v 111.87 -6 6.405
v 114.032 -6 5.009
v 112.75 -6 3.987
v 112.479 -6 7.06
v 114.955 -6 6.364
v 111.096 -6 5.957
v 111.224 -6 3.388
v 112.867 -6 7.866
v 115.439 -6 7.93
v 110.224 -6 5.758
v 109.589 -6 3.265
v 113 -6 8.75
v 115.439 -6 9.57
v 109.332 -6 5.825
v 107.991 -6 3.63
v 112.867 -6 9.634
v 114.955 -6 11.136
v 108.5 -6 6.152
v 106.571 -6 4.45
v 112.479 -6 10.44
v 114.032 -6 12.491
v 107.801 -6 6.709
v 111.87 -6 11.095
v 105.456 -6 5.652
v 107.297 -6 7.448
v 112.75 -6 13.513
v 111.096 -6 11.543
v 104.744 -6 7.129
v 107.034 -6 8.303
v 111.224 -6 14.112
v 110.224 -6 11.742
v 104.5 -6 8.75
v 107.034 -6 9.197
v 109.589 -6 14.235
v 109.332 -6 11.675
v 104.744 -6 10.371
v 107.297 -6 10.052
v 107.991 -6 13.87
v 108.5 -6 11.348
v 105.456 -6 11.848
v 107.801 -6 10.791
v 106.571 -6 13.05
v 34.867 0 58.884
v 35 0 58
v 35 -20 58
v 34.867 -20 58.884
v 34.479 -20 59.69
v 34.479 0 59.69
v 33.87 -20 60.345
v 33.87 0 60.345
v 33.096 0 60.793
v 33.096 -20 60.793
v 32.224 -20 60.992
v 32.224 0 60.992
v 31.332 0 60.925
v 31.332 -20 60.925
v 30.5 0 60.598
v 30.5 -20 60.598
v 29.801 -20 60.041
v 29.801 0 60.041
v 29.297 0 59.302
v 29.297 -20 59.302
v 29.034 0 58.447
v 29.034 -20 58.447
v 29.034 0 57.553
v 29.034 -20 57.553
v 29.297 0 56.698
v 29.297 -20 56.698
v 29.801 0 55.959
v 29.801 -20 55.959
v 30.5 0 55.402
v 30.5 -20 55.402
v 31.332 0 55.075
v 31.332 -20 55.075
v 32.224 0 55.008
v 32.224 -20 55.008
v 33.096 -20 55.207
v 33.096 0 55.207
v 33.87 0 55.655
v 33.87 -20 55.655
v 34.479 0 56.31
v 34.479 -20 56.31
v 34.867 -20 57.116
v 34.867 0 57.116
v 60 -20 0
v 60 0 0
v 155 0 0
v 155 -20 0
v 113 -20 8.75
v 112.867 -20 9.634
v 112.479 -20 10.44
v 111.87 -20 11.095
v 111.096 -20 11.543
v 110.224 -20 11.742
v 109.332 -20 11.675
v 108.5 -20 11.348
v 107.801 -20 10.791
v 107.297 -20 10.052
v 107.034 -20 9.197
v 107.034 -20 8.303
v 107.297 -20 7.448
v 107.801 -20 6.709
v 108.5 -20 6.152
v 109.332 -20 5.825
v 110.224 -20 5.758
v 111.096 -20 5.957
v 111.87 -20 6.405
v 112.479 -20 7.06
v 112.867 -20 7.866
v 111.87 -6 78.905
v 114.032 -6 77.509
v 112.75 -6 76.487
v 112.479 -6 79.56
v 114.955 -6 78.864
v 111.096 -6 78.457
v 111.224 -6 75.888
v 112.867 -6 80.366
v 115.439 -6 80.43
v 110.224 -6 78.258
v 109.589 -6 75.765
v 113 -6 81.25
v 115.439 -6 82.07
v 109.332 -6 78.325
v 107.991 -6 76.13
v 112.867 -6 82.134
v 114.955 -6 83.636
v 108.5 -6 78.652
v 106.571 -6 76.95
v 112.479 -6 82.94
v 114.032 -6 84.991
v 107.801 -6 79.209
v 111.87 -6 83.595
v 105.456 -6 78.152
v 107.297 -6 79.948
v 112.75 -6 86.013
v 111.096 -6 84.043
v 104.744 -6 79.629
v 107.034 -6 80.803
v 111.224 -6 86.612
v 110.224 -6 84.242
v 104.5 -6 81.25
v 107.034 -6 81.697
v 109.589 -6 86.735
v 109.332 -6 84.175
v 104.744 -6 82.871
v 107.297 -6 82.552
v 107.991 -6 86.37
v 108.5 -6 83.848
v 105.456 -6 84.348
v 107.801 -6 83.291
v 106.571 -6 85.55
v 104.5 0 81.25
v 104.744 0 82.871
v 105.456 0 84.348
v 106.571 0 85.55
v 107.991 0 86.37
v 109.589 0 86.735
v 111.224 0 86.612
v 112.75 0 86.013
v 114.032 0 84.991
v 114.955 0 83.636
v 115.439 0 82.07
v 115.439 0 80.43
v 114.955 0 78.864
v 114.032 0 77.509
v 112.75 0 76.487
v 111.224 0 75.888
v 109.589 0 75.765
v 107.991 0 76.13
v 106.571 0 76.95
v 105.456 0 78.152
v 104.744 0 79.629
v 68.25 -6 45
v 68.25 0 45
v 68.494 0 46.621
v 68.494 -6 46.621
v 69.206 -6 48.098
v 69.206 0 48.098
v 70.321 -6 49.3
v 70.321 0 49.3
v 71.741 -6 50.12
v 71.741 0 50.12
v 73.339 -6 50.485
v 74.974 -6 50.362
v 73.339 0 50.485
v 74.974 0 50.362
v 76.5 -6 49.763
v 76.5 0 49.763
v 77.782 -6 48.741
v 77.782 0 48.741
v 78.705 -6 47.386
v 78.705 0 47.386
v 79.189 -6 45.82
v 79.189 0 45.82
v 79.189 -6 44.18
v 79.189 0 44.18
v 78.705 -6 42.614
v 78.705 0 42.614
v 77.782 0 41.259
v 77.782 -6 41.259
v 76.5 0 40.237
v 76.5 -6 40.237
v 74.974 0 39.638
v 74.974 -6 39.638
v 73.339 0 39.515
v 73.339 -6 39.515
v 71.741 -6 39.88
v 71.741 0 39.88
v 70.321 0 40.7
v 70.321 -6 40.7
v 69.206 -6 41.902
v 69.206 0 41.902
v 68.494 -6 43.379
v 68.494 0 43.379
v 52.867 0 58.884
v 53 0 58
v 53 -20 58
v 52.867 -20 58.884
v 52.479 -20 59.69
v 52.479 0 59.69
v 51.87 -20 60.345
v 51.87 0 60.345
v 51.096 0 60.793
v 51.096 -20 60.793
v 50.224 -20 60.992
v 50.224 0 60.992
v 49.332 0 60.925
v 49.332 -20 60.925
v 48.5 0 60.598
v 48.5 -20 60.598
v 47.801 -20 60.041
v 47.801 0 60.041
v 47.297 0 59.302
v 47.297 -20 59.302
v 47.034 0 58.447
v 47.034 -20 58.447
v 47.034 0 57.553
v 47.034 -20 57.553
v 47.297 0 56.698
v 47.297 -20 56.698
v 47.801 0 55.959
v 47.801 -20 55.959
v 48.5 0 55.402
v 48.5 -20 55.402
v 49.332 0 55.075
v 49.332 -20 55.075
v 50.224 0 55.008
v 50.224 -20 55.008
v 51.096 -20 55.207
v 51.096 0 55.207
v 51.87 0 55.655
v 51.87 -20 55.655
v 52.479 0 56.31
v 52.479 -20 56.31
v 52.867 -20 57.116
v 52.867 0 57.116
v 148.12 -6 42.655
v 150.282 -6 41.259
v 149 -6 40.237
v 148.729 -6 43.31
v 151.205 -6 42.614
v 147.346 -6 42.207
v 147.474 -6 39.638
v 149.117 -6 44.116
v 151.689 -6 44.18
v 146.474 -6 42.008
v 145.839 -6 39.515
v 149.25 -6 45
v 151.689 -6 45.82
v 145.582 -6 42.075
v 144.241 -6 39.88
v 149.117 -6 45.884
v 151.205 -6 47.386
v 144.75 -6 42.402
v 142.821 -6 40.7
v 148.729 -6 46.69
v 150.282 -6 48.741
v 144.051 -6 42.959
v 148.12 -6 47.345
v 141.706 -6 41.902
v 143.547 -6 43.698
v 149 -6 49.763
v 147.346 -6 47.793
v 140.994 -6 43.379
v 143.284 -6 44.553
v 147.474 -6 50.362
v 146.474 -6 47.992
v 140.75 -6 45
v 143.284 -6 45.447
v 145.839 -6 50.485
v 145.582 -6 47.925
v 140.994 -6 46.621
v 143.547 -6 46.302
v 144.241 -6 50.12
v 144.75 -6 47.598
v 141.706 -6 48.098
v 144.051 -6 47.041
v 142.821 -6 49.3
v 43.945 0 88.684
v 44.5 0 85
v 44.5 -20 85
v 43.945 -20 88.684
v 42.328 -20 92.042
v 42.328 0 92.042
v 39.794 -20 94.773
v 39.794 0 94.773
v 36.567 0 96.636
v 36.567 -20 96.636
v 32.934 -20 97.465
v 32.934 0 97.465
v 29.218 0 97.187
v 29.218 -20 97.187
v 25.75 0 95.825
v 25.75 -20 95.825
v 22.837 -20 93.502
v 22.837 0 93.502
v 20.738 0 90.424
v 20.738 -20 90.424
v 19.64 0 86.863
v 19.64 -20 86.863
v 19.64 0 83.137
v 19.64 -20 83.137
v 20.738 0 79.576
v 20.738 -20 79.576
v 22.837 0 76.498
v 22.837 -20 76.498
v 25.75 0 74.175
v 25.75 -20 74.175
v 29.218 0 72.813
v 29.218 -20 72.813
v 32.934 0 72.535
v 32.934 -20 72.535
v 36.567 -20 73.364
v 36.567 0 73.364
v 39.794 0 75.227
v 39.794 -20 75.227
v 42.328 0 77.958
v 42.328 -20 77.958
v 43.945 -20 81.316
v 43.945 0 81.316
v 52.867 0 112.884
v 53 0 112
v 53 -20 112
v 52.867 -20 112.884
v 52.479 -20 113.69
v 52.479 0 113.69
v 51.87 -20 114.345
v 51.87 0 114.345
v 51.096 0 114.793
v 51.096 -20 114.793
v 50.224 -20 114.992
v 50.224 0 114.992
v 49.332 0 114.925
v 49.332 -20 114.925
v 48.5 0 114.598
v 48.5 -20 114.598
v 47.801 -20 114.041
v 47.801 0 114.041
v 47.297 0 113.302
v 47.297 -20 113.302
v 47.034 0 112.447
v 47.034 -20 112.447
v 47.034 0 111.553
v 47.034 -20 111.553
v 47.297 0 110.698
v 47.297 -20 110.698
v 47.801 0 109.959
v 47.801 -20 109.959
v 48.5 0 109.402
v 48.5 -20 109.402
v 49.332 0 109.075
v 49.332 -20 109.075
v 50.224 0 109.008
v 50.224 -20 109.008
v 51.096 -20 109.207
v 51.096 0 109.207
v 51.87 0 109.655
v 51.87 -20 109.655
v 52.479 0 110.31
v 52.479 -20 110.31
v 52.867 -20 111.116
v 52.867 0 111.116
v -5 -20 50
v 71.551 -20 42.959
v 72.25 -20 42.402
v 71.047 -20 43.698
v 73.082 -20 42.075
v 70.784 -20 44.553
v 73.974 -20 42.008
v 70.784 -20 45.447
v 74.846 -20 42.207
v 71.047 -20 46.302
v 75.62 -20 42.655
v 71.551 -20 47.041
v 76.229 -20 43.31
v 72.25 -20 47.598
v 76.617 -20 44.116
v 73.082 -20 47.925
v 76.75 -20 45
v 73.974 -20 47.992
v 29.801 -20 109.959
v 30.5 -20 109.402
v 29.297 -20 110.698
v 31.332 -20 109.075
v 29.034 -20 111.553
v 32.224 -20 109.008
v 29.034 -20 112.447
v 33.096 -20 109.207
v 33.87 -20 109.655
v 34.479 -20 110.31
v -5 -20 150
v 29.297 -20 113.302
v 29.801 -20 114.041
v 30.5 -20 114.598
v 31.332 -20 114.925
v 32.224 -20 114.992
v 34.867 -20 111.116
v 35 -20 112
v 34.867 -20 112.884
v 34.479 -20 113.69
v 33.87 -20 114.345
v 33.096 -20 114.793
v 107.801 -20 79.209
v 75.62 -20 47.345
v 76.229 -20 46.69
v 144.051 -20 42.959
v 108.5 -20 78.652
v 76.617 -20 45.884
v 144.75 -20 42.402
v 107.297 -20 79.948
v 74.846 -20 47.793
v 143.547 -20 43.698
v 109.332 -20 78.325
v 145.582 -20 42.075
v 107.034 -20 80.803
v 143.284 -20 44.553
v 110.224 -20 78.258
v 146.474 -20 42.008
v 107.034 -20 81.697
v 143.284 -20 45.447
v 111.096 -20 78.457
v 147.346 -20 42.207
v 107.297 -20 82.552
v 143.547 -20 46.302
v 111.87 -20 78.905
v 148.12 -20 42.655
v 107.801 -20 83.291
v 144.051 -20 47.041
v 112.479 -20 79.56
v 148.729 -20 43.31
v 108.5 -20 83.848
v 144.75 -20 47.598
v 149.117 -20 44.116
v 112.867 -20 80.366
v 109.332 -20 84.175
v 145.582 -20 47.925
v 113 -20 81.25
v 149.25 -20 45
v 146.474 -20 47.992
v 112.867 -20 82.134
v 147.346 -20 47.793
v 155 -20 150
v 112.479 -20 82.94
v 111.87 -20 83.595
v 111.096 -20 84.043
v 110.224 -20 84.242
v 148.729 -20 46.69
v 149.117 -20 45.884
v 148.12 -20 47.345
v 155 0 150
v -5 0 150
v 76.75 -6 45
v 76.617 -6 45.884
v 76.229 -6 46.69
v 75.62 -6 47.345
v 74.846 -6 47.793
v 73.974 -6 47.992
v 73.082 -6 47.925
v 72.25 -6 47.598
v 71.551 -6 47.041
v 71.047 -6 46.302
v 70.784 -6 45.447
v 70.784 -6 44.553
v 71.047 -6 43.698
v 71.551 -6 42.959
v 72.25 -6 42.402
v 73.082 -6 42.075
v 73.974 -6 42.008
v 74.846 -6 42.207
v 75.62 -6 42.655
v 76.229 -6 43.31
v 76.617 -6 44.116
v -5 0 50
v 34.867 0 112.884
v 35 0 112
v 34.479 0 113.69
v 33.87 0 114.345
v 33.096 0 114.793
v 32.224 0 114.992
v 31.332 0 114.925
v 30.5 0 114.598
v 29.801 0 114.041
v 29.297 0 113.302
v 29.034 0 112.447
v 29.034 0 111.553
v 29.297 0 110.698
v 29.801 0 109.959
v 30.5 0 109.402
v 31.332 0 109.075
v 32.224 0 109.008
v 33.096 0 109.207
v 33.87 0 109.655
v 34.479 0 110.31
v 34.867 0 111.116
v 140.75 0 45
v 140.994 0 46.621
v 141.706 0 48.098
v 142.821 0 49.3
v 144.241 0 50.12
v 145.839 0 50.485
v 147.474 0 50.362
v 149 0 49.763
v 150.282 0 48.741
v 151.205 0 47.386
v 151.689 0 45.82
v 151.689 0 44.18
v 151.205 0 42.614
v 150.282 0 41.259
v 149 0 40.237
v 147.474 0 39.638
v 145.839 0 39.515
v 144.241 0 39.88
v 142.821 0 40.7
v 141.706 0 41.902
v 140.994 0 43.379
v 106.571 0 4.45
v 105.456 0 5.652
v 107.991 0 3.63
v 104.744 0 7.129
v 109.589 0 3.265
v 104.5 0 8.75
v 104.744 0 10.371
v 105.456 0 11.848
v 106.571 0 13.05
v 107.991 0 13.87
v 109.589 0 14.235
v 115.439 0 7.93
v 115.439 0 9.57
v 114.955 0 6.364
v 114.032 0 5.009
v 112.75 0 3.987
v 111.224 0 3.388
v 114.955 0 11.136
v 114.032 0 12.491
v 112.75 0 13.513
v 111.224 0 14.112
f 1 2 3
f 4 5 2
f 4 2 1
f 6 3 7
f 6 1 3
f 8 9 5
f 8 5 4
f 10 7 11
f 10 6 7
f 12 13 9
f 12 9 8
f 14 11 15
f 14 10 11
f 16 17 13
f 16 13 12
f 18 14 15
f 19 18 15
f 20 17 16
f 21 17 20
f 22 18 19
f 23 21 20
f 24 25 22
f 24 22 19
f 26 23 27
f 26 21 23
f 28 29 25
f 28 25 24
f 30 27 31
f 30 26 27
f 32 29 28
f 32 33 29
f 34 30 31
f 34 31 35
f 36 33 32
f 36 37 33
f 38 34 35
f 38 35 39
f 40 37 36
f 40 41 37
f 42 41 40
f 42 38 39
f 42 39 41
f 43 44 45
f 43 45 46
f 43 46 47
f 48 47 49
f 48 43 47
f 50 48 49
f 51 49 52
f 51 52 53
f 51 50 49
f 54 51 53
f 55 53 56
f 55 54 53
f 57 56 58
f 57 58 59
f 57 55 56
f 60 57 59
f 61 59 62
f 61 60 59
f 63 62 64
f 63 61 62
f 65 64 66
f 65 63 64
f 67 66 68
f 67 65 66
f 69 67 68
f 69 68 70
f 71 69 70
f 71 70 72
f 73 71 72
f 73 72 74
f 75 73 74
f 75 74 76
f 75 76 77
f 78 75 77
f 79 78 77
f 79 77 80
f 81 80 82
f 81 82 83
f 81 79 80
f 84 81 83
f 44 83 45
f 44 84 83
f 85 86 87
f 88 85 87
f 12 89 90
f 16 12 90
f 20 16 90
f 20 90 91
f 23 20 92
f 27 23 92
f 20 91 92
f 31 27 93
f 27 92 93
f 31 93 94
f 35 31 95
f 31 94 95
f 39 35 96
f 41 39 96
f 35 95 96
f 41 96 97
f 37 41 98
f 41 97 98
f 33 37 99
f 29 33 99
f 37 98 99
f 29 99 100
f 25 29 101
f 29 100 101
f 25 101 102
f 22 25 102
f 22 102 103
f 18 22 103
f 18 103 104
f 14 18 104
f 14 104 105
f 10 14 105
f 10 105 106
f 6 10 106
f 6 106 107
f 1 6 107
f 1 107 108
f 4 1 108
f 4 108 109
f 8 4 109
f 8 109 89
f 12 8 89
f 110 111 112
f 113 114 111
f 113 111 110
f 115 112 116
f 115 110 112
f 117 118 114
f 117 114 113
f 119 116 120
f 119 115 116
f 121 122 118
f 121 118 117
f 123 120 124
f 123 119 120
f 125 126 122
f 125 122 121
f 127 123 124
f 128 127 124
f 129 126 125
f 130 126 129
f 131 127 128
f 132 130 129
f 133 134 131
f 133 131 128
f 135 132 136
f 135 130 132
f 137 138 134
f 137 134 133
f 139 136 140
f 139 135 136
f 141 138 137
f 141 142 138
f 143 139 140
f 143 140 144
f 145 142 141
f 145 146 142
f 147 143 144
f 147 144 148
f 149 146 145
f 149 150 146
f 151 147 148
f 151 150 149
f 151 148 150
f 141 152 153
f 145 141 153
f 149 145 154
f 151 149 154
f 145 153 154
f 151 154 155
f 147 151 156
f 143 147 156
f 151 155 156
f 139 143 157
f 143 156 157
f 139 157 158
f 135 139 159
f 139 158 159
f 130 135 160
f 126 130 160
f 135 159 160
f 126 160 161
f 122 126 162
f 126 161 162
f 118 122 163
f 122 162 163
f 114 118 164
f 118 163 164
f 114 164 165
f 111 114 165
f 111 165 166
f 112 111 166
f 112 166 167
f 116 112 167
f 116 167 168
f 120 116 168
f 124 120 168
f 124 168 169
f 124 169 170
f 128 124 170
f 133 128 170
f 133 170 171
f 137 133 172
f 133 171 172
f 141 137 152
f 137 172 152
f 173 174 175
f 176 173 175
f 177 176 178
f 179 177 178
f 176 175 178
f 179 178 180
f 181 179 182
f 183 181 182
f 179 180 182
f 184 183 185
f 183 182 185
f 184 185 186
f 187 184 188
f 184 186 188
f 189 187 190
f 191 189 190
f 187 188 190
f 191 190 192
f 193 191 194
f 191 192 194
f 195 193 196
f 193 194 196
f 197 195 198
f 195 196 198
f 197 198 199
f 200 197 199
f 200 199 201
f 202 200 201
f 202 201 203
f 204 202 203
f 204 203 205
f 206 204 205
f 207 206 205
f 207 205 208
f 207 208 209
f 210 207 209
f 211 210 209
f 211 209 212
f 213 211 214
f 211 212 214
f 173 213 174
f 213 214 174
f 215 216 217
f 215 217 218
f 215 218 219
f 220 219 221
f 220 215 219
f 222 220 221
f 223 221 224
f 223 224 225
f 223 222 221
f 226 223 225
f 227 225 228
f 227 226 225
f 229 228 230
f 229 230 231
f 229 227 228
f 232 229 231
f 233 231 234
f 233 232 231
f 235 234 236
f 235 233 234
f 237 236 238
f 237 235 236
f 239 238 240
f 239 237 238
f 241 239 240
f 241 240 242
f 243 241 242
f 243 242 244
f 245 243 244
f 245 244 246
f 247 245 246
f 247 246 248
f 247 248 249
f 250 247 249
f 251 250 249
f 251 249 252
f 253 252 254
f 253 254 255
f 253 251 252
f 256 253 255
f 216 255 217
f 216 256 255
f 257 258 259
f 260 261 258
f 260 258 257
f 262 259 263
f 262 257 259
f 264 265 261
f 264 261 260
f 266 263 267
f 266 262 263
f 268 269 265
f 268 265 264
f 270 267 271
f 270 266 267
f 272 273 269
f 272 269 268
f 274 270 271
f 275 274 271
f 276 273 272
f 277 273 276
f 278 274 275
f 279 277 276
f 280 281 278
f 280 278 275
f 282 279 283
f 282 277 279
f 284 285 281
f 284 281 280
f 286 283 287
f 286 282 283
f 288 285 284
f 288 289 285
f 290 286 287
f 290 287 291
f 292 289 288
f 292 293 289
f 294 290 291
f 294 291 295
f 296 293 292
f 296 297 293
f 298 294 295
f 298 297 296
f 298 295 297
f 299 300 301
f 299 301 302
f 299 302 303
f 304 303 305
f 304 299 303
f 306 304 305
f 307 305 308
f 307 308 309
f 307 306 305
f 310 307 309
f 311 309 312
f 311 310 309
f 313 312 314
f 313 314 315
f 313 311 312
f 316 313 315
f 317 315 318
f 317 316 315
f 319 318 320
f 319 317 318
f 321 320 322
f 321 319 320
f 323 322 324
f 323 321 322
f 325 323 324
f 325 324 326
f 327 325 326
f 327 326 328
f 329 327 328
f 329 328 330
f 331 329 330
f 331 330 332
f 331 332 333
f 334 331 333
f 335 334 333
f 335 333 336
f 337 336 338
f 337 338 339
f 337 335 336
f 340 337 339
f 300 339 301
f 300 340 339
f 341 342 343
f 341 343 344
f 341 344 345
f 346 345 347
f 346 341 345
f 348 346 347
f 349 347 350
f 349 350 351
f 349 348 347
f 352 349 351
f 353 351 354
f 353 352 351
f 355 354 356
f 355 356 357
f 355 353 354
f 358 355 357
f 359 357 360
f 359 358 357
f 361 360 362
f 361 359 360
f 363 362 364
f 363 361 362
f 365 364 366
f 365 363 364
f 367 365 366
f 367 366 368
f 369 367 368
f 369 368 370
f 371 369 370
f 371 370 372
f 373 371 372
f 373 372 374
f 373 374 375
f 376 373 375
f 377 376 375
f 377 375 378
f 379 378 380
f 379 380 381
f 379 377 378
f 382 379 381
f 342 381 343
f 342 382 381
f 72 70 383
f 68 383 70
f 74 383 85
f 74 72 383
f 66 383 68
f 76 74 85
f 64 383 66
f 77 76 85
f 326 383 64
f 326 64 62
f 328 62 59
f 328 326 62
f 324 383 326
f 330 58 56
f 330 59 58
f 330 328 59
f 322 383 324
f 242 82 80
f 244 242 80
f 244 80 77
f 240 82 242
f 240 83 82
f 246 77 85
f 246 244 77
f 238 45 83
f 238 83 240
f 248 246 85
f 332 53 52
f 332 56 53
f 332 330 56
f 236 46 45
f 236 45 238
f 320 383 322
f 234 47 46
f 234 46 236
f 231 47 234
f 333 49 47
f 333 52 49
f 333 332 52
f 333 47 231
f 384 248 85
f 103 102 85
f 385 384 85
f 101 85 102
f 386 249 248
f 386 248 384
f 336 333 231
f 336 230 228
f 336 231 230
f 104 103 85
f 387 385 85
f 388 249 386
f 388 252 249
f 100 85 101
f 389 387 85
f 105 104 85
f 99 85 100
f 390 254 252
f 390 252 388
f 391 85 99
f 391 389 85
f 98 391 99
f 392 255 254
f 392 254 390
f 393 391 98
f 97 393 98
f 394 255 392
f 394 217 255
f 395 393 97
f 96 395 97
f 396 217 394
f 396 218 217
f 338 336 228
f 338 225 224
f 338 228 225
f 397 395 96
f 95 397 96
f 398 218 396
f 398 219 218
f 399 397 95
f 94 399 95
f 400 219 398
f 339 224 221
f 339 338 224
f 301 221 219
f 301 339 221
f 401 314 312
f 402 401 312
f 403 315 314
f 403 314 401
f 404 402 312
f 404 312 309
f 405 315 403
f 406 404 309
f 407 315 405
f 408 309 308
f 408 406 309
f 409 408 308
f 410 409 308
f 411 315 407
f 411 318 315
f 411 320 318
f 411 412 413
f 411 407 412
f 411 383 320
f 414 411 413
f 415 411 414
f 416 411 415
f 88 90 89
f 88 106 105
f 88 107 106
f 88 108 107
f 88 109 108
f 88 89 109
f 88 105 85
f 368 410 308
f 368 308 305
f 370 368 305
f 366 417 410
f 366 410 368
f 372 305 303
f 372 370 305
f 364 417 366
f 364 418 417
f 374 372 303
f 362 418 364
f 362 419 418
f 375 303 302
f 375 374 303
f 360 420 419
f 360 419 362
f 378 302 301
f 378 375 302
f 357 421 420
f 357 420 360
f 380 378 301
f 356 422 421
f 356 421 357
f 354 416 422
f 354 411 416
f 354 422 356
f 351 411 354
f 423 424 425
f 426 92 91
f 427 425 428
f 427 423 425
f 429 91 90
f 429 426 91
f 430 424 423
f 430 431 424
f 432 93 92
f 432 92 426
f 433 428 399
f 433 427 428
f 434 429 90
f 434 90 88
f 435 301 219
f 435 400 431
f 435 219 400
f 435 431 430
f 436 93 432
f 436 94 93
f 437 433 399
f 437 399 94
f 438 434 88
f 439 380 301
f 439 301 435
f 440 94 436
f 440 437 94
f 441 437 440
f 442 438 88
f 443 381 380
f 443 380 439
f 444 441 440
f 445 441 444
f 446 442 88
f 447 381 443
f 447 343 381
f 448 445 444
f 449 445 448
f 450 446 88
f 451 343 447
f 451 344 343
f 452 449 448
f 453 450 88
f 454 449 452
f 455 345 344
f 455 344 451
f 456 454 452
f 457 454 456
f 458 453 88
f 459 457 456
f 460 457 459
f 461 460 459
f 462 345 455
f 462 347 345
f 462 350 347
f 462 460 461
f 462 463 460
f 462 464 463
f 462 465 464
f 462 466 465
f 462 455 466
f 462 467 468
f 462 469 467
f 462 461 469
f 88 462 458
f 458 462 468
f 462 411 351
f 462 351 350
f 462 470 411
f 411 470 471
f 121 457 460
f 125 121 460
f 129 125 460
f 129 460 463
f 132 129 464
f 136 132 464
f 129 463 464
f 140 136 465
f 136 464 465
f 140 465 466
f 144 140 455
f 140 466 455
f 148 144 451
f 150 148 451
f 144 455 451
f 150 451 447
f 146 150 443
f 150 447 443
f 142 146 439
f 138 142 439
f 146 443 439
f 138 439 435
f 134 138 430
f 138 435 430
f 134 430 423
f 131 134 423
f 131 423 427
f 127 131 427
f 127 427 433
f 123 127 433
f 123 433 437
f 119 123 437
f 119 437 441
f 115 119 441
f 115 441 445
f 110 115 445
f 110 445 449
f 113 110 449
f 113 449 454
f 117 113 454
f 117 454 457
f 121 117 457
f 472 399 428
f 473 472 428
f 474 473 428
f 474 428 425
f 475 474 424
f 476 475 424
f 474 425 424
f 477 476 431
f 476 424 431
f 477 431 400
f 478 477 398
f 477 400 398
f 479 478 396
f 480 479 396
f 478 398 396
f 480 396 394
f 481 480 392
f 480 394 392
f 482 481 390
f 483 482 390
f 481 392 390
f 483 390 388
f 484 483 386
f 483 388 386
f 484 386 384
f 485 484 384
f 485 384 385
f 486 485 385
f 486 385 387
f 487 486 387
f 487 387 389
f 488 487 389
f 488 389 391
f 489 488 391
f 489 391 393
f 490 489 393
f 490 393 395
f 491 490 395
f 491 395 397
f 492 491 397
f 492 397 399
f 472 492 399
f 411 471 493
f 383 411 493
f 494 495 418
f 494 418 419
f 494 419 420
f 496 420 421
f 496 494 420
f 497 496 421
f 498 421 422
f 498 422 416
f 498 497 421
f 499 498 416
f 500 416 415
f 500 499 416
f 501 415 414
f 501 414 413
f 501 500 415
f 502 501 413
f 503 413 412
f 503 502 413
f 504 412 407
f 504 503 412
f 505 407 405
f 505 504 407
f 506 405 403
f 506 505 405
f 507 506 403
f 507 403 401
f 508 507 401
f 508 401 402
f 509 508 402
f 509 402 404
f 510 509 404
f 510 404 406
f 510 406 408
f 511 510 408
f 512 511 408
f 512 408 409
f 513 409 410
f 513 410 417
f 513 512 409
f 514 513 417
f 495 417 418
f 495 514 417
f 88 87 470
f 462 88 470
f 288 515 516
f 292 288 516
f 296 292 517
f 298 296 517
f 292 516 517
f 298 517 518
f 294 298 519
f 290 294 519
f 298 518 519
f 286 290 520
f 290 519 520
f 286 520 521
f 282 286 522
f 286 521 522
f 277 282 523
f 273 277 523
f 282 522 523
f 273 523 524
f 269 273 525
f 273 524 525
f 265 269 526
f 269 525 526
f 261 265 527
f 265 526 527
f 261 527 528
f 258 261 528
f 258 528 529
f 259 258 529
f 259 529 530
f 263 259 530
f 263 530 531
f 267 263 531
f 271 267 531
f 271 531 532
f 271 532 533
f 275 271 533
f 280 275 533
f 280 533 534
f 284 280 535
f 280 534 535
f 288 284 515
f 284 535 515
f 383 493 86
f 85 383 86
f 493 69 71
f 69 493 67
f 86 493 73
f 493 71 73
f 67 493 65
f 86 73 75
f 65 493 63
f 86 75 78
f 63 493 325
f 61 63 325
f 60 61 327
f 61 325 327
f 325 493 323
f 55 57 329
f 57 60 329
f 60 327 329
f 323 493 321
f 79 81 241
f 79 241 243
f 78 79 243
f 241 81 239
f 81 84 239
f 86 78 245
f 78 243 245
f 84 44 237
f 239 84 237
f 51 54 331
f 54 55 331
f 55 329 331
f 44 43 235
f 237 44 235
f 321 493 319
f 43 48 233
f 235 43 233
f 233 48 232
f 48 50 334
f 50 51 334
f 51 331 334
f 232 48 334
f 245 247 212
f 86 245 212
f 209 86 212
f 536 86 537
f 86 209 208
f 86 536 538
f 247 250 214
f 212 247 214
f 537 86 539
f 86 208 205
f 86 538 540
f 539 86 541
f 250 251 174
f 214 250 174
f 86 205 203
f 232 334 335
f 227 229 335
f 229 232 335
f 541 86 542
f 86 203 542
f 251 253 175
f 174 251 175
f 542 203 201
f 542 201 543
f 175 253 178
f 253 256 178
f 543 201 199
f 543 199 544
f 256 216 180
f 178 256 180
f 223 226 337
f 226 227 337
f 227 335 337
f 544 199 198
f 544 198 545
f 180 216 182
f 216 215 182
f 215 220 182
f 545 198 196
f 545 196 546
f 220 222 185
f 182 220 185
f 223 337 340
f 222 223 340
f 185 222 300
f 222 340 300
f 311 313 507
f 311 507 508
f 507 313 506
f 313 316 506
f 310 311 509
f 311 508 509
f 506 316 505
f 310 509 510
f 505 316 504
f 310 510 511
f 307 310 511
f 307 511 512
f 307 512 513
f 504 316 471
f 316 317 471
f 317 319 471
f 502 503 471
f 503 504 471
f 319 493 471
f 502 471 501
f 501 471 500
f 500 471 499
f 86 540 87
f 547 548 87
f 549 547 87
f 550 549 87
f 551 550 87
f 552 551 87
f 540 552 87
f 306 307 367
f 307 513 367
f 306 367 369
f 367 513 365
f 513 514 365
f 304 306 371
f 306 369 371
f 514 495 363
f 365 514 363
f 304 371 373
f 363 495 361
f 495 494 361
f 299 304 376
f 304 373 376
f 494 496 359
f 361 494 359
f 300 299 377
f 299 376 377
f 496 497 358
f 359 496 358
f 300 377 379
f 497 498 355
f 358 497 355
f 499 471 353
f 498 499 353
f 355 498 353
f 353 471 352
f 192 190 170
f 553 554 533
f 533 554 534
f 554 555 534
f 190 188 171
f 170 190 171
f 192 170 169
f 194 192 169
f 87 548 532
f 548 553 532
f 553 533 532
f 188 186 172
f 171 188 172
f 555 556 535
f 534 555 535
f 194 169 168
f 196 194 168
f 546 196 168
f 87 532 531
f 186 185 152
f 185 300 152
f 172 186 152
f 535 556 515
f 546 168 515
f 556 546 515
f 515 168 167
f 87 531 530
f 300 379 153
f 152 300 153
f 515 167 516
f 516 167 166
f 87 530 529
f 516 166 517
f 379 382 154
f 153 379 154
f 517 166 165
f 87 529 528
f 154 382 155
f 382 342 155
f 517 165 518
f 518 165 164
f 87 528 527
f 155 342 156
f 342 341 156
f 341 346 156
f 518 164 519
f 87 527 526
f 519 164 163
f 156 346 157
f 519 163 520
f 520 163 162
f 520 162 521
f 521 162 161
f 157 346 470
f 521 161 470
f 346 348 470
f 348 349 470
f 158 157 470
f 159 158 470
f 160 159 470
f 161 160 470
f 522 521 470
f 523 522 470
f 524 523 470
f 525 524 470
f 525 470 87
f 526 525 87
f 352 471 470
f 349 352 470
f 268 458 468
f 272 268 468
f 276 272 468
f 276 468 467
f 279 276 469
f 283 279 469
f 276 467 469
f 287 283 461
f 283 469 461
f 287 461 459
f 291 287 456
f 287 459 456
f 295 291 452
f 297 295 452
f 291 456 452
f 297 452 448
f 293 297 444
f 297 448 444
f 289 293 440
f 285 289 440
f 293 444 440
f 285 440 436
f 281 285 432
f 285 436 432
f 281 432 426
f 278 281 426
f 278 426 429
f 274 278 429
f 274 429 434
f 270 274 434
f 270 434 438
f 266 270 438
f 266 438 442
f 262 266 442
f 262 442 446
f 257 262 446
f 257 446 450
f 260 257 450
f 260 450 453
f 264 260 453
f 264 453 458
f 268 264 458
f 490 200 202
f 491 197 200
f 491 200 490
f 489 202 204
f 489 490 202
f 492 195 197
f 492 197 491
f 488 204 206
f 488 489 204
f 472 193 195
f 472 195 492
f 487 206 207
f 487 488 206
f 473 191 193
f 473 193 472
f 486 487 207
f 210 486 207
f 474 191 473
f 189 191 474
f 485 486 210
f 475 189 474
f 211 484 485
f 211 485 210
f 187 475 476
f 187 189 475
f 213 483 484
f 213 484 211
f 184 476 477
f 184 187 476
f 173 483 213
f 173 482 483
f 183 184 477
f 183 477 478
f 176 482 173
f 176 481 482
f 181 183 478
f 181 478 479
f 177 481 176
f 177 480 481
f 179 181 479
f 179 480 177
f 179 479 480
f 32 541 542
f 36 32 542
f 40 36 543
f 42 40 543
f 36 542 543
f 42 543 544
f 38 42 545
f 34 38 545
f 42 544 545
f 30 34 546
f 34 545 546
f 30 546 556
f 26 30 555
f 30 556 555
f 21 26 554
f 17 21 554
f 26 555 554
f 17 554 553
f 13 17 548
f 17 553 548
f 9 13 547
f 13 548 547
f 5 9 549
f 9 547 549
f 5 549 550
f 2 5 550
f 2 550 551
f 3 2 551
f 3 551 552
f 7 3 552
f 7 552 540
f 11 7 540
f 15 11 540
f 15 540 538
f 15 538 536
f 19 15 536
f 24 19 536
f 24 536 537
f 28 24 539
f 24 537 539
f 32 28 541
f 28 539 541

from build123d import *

# Parameters (mm, degrees)
F0_R     = 18
F0_R_2   = 3
F0_W     = 3
F0_H     = 17
F0_H_2   = 27
F0_R_3   = 12.5
F1_DEPTH = 20
F2_DEPTH = 25
F3_R     = 3
F4_DEPTH = 25
F5_R     = 5.5
F6_DEPTH = 6


with BuildPart() as f1:
    # F0 (on Front) → F1 (new body)
    with BuildSketch(Plane.XZ):
        Polygon((60, 50), (60, 0), (155, 0), (155, 90), (63, 90), (63, 63), (60, 63), align=None)
        Polygon((1, 63), (60, 63), (60, 90), (60, 107), (1, 107), align=None)
        with Locations((32, 85)):
            Circle(F0_R, mode=Mode.SUBTRACT)
        Polygon((-5, 50), (60, 50), (60, 63), (1, 63), (1, 107), (60, 107), (60, 120), (-5, 120), align=None)
        with Locations((32, 58)):
            Circle(F0_R_2, mode=Mode.SUBTRACT)
        with Locations((50, 58)):
            Circle(F0_R_2, mode=Mode.SUBTRACT)
        with Locations((32, 112)):
            Circle(F0_R_2, mode=Mode.SUBTRACT)
        with Locations((50, 112)):
            Circle(F0_R_2, mode=Mode.SUBTRACT)
        Polygon((63, 90), (155, 90), (155, 150), (-5, 150), (-5, 120), (60, 120), (60, 107), (63, 107), align=None)
        with Locations((61.5, 98.5)):
            Rectangle(F0_W, F0_H)
        with Locations((61.5, 76.5)):
            Rectangle(F0_W, F0_H_2)
        with Locations((32, 85)):
            Circle(F0_R_3)
        with Locations((32, 85)):
            Circle(F0_R)
        with Locations((32, 85)):
            Circle(F0_R_3, mode=Mode.SUBTRACT)
        Polygon((-5, 50), (60, 0), (60, 50), align=None)
    extrude(amount=F1_DEPTH)

    # F0 (on Front) → F2 (cut)
    with BuildSketch(Plane.XZ):
        with Locations((32, 85)):
            Circle(F0_R_3)
    extrude(amount=F2_DEPTH, mode=Mode.SUBTRACT)

    # F3 (on face) → F4 (cut)
    with BuildSketch(Plane.XZ.offset(20)):
        with Locations((110, 81.25)):
            Circle(F3_R)
        with Locations((146.25, 45)):
            Circle(F3_R)
        with Locations((73.75, 45)):
            Circle(F3_R)
        with Locations((110, 8.75)):
            Circle(F3_R)
    extrude(amount=-F4_DEPTH, mode=Mode.SUBTRACT)

    # F5 (on face) → F6 (cut)
    with BuildSketch(Plane(origin=(0, 0, 0), x_dir=(-1, 0, 0), z_dir=(0, 1, 0))):
        with Locations((-146.25, 45)):
            Circle(F5_R)
        with Locations((-110, 81.25)):
            Circle(F5_R)
        with Locations((-73.75, 45)):
            Circle(F5_R)
        with Locations((-110, 8.75)):
            Circle(F5_R)
    extrude(amount=-F6_DEPTH, mode=Mode.SUBTRACT)


solid = f1.part
